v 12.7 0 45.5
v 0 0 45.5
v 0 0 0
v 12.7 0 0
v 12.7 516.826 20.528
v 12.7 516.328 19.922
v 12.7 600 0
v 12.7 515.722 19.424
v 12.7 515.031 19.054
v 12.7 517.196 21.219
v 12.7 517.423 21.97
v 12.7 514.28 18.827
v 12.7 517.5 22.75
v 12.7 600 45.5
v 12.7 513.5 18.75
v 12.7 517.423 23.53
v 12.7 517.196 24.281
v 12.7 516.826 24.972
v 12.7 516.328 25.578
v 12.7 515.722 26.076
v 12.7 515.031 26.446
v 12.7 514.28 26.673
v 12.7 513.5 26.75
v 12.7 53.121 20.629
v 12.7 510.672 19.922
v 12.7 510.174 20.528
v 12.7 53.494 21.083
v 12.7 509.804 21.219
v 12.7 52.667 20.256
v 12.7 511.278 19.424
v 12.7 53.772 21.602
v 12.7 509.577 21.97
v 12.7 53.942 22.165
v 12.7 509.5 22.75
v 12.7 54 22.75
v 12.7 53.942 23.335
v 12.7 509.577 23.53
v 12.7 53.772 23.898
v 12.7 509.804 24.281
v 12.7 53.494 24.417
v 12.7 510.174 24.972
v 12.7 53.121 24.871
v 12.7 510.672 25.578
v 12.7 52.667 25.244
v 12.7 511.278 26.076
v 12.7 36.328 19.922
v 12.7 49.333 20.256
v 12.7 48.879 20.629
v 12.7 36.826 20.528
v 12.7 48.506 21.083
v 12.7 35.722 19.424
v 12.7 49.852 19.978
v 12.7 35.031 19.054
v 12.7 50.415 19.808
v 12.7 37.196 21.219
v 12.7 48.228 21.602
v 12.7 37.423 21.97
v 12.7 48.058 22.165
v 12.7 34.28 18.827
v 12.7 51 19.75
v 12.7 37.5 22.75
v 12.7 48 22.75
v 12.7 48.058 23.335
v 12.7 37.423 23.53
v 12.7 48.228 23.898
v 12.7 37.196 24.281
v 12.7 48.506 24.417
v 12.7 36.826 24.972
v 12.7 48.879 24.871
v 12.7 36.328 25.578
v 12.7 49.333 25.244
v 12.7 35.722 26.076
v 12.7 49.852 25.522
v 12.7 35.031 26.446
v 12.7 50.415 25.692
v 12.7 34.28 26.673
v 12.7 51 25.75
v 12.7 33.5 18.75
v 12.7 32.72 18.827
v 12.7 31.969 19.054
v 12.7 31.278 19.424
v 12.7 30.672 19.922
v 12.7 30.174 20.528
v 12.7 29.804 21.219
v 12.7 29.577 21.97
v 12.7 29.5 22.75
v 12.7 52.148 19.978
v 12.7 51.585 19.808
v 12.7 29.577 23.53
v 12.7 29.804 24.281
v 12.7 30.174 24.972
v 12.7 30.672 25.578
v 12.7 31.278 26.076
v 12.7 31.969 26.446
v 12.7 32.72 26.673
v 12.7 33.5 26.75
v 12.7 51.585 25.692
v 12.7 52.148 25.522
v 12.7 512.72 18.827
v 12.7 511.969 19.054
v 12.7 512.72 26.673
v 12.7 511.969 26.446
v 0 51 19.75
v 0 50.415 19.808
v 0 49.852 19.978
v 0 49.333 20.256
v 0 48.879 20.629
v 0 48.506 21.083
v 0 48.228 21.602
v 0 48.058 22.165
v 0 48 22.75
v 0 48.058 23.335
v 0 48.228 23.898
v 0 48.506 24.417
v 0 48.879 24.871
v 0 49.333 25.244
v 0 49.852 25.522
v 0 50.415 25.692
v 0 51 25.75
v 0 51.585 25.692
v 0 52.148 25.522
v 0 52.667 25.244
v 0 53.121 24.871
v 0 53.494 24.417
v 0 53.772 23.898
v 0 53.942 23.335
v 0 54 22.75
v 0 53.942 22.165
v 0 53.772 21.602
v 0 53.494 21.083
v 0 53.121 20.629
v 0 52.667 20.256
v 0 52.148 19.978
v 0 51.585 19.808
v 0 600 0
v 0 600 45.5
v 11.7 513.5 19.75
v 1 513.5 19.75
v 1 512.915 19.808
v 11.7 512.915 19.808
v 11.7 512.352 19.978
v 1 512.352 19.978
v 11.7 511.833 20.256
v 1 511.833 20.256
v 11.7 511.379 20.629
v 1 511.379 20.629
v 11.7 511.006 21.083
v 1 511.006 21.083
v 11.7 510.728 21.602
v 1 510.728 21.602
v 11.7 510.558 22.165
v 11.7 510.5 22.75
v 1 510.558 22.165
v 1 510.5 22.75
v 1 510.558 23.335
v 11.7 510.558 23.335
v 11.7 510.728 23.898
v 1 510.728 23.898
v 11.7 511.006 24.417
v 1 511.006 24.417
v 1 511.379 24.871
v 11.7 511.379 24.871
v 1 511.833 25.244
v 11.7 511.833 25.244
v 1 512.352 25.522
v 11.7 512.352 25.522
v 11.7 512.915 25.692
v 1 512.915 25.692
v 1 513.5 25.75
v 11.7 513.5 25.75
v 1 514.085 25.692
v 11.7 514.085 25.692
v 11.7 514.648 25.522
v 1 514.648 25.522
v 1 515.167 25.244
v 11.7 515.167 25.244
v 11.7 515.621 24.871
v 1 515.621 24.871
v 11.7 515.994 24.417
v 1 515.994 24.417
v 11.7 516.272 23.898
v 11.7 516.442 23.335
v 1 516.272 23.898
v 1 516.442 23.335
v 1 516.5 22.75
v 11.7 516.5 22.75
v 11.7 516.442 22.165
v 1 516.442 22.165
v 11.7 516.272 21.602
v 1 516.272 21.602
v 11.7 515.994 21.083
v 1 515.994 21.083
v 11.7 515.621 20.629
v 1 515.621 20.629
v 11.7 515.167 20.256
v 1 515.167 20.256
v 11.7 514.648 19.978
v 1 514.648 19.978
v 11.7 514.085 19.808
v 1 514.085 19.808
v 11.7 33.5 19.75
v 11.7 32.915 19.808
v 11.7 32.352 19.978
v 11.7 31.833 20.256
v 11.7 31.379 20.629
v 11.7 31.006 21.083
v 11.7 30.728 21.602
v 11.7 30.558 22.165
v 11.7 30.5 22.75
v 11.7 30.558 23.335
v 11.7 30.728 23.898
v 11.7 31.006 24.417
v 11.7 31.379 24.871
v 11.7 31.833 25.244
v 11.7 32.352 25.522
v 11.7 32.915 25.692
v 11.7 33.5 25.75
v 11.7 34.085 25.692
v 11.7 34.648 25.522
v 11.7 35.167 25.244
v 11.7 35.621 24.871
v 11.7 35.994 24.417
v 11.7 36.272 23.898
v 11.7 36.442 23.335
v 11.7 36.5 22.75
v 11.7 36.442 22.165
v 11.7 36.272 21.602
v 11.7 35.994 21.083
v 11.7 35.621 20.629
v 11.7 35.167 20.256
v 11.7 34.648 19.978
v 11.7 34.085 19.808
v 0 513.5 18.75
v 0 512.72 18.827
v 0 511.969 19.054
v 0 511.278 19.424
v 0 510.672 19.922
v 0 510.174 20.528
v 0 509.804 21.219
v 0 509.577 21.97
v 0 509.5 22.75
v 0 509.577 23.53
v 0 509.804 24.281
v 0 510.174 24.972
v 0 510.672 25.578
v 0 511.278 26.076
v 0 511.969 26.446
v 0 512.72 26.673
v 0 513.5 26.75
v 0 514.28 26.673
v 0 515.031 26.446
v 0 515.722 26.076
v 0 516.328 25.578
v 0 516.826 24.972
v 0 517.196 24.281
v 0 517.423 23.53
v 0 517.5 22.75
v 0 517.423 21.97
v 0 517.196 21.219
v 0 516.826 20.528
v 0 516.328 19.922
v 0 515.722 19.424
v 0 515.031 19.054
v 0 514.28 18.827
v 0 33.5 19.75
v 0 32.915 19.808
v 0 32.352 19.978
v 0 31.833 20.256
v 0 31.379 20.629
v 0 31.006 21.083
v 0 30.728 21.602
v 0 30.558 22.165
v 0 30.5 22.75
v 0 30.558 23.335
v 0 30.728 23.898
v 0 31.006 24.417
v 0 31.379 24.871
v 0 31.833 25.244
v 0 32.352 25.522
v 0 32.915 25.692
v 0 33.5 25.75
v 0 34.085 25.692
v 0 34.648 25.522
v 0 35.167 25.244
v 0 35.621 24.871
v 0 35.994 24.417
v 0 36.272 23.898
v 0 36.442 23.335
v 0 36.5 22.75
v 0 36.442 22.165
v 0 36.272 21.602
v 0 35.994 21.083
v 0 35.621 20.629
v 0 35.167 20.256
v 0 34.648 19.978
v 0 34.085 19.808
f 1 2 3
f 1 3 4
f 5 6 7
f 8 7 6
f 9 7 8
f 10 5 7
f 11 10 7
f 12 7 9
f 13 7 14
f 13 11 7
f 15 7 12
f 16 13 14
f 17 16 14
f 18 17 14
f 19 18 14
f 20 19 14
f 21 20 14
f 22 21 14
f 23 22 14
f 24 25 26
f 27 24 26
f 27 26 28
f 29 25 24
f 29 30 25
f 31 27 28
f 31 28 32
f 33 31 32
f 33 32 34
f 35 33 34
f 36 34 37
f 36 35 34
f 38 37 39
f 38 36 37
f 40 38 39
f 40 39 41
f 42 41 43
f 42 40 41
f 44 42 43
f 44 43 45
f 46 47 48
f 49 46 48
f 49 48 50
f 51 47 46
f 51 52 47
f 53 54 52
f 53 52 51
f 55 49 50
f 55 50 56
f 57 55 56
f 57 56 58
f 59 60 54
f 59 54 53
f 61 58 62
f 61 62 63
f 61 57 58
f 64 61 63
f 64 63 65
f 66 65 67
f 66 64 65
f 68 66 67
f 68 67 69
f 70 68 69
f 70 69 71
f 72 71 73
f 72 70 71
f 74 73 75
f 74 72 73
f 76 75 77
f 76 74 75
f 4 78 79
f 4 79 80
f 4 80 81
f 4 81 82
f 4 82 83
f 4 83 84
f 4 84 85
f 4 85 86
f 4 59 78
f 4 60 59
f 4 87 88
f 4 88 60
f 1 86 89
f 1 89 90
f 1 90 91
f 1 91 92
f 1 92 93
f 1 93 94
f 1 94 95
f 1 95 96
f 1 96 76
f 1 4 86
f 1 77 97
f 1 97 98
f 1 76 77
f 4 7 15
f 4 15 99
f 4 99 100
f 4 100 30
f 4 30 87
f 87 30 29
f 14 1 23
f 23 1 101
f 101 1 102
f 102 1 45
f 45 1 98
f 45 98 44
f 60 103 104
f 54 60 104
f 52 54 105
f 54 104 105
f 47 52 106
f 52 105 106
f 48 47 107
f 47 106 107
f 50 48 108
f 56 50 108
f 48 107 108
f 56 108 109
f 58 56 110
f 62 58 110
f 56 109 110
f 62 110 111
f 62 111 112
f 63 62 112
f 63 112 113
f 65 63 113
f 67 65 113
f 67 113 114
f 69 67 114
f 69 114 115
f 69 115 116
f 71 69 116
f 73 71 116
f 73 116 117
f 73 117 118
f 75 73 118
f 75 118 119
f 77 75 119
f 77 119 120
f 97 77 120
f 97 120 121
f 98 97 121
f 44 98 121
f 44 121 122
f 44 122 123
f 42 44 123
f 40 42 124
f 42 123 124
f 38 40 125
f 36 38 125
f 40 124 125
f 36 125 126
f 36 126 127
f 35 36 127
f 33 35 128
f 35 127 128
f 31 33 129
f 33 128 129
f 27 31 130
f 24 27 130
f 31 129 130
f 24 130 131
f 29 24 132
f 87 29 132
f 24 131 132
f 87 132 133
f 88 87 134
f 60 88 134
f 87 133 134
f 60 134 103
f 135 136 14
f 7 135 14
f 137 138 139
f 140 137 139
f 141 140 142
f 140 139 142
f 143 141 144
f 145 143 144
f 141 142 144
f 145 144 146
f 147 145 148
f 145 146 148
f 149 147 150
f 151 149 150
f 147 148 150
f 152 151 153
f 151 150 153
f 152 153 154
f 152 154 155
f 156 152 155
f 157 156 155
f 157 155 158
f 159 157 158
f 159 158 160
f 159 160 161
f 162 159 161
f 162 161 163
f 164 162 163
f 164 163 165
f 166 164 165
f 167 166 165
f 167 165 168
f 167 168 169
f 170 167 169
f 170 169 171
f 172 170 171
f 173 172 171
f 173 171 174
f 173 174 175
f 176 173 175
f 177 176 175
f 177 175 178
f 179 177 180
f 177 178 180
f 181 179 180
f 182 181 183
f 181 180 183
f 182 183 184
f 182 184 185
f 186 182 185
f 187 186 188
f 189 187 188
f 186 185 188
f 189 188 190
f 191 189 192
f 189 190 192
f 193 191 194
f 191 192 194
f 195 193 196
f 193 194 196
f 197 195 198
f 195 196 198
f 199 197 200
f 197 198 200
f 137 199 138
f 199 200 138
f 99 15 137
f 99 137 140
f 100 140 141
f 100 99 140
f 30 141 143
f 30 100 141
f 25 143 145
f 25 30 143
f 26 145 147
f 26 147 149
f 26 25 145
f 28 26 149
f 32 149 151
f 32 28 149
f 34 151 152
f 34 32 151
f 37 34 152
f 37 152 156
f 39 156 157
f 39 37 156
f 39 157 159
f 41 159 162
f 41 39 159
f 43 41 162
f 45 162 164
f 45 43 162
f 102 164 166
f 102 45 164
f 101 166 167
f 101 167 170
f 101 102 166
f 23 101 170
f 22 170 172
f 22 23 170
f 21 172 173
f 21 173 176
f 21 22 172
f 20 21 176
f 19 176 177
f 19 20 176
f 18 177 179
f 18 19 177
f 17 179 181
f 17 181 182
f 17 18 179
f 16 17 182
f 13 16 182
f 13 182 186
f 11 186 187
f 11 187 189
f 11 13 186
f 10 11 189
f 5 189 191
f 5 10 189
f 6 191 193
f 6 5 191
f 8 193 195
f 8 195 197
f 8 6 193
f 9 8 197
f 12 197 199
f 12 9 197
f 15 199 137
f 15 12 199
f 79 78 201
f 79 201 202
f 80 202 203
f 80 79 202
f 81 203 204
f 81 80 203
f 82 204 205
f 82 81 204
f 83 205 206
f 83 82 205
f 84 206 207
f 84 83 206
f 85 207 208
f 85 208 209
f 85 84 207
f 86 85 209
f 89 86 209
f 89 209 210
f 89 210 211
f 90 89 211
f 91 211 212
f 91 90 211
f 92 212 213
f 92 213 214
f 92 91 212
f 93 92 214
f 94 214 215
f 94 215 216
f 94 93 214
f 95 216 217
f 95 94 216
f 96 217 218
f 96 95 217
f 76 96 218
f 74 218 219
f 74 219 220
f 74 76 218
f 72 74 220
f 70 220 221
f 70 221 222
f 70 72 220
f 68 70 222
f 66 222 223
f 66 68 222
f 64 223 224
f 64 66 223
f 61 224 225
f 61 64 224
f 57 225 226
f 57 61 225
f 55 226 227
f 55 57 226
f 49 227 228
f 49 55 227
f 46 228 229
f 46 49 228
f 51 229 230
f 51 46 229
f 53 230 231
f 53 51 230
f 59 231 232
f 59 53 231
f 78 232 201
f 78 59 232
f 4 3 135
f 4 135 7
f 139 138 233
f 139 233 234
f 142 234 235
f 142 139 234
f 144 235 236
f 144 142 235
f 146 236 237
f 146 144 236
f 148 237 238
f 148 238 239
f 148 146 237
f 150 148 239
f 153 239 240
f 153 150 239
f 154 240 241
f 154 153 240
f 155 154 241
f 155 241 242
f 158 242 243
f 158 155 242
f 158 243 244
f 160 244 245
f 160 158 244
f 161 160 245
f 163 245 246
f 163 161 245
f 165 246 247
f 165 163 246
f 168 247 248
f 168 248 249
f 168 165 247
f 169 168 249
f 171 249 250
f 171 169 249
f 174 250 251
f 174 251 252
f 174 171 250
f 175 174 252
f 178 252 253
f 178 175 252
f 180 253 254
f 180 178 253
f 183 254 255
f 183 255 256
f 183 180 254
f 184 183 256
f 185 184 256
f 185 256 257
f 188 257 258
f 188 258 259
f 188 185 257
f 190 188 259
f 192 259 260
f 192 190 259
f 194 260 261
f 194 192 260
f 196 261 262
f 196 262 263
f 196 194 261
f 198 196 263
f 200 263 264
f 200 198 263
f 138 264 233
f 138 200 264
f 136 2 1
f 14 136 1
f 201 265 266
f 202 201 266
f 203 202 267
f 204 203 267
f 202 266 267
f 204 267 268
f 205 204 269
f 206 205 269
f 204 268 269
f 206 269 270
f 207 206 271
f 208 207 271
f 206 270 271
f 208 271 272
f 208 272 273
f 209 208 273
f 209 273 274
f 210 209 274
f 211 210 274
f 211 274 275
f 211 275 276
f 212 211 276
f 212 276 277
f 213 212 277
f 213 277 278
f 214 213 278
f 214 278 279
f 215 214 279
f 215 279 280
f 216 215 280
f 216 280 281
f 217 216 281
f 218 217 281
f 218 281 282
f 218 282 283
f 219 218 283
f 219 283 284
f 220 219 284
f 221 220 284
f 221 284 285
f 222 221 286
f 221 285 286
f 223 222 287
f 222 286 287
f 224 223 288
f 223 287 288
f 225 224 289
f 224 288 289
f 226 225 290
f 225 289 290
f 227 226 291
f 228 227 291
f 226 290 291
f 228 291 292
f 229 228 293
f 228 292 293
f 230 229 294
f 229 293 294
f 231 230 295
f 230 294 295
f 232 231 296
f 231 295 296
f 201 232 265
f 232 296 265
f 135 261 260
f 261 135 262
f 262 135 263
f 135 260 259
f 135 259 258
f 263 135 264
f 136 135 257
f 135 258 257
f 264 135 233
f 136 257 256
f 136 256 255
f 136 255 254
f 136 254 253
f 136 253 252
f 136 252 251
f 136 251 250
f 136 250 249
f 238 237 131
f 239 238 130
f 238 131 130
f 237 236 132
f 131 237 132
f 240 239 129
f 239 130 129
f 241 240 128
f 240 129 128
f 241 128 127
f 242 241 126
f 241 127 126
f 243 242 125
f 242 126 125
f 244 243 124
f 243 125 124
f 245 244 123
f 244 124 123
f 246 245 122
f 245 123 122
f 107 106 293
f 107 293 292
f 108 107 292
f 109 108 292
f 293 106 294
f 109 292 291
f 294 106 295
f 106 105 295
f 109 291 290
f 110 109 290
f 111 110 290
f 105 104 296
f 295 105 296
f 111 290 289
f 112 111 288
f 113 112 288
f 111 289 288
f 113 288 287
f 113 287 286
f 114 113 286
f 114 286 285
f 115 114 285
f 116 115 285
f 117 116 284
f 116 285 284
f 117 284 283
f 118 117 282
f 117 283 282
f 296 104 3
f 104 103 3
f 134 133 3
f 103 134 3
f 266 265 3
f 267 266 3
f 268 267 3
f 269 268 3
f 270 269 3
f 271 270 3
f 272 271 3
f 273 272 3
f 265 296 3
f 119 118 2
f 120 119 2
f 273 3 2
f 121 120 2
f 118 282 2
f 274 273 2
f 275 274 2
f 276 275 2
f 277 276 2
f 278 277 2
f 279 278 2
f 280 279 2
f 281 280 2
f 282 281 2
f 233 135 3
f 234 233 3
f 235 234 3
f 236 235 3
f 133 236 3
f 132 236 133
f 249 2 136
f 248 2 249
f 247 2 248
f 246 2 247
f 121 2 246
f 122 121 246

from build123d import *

# Parameters (mm, degrees)
SKETCH_W        = 12.7
SKETCH_H        = 45.5
PAD_DEPTH       = 600
SKETCH001_R     = 3
HOLE_DEPTH      = 25
CHAMFER_SIZE    = 1
CHAMFER001_SIZE = 1


with BuildPart() as part:
    # Sketch → Pad (new body)
    with BuildSketch(Plane.XZ):
        with Locations((6.35, 22.75)):
            Rectangle(SKETCH_W, SKETCH_H)
    extrude(amount=-PAD_DEPTH)

    # Sketch001 (on Face4 of Pad) → Hole (cut)
    with BuildSketch(Plane(origin=(0, 0, 0), x_dir=(0, 0, -1), z_dir=(-1, 0, 0))):
        with Locations((-22.75, -51)):
            Circle(SKETCH001_R)
        with Locations((-22.75, -33.5)):
            Circle(SKETCH001_R)
        with Locations((-22.75, -513.5)):
            Circle(SKETCH001_R)
    extrude(amount=-HOLE_DEPTH, mode=Mode.SUBTRACT)

    # Chamfer
    chamfer_edges = [part.edges().sort_by_distance(p)[0] for p in [
        (0, 516.5, 22.75),
    ]]
    chamfer(chamfer_edges, length=CHAMFER_SIZE)

    # Chamfer001
    chamfer001_edges = [part.edges().sort_by_distance(p)[0] for p in [
        (12.7, 36.5, 22.75),
        (12.7, 516.5, 22.75),
    ]]
    chamfer(chamfer001_edges, length=CHAMFER001_SIZE)


solid = part.part
